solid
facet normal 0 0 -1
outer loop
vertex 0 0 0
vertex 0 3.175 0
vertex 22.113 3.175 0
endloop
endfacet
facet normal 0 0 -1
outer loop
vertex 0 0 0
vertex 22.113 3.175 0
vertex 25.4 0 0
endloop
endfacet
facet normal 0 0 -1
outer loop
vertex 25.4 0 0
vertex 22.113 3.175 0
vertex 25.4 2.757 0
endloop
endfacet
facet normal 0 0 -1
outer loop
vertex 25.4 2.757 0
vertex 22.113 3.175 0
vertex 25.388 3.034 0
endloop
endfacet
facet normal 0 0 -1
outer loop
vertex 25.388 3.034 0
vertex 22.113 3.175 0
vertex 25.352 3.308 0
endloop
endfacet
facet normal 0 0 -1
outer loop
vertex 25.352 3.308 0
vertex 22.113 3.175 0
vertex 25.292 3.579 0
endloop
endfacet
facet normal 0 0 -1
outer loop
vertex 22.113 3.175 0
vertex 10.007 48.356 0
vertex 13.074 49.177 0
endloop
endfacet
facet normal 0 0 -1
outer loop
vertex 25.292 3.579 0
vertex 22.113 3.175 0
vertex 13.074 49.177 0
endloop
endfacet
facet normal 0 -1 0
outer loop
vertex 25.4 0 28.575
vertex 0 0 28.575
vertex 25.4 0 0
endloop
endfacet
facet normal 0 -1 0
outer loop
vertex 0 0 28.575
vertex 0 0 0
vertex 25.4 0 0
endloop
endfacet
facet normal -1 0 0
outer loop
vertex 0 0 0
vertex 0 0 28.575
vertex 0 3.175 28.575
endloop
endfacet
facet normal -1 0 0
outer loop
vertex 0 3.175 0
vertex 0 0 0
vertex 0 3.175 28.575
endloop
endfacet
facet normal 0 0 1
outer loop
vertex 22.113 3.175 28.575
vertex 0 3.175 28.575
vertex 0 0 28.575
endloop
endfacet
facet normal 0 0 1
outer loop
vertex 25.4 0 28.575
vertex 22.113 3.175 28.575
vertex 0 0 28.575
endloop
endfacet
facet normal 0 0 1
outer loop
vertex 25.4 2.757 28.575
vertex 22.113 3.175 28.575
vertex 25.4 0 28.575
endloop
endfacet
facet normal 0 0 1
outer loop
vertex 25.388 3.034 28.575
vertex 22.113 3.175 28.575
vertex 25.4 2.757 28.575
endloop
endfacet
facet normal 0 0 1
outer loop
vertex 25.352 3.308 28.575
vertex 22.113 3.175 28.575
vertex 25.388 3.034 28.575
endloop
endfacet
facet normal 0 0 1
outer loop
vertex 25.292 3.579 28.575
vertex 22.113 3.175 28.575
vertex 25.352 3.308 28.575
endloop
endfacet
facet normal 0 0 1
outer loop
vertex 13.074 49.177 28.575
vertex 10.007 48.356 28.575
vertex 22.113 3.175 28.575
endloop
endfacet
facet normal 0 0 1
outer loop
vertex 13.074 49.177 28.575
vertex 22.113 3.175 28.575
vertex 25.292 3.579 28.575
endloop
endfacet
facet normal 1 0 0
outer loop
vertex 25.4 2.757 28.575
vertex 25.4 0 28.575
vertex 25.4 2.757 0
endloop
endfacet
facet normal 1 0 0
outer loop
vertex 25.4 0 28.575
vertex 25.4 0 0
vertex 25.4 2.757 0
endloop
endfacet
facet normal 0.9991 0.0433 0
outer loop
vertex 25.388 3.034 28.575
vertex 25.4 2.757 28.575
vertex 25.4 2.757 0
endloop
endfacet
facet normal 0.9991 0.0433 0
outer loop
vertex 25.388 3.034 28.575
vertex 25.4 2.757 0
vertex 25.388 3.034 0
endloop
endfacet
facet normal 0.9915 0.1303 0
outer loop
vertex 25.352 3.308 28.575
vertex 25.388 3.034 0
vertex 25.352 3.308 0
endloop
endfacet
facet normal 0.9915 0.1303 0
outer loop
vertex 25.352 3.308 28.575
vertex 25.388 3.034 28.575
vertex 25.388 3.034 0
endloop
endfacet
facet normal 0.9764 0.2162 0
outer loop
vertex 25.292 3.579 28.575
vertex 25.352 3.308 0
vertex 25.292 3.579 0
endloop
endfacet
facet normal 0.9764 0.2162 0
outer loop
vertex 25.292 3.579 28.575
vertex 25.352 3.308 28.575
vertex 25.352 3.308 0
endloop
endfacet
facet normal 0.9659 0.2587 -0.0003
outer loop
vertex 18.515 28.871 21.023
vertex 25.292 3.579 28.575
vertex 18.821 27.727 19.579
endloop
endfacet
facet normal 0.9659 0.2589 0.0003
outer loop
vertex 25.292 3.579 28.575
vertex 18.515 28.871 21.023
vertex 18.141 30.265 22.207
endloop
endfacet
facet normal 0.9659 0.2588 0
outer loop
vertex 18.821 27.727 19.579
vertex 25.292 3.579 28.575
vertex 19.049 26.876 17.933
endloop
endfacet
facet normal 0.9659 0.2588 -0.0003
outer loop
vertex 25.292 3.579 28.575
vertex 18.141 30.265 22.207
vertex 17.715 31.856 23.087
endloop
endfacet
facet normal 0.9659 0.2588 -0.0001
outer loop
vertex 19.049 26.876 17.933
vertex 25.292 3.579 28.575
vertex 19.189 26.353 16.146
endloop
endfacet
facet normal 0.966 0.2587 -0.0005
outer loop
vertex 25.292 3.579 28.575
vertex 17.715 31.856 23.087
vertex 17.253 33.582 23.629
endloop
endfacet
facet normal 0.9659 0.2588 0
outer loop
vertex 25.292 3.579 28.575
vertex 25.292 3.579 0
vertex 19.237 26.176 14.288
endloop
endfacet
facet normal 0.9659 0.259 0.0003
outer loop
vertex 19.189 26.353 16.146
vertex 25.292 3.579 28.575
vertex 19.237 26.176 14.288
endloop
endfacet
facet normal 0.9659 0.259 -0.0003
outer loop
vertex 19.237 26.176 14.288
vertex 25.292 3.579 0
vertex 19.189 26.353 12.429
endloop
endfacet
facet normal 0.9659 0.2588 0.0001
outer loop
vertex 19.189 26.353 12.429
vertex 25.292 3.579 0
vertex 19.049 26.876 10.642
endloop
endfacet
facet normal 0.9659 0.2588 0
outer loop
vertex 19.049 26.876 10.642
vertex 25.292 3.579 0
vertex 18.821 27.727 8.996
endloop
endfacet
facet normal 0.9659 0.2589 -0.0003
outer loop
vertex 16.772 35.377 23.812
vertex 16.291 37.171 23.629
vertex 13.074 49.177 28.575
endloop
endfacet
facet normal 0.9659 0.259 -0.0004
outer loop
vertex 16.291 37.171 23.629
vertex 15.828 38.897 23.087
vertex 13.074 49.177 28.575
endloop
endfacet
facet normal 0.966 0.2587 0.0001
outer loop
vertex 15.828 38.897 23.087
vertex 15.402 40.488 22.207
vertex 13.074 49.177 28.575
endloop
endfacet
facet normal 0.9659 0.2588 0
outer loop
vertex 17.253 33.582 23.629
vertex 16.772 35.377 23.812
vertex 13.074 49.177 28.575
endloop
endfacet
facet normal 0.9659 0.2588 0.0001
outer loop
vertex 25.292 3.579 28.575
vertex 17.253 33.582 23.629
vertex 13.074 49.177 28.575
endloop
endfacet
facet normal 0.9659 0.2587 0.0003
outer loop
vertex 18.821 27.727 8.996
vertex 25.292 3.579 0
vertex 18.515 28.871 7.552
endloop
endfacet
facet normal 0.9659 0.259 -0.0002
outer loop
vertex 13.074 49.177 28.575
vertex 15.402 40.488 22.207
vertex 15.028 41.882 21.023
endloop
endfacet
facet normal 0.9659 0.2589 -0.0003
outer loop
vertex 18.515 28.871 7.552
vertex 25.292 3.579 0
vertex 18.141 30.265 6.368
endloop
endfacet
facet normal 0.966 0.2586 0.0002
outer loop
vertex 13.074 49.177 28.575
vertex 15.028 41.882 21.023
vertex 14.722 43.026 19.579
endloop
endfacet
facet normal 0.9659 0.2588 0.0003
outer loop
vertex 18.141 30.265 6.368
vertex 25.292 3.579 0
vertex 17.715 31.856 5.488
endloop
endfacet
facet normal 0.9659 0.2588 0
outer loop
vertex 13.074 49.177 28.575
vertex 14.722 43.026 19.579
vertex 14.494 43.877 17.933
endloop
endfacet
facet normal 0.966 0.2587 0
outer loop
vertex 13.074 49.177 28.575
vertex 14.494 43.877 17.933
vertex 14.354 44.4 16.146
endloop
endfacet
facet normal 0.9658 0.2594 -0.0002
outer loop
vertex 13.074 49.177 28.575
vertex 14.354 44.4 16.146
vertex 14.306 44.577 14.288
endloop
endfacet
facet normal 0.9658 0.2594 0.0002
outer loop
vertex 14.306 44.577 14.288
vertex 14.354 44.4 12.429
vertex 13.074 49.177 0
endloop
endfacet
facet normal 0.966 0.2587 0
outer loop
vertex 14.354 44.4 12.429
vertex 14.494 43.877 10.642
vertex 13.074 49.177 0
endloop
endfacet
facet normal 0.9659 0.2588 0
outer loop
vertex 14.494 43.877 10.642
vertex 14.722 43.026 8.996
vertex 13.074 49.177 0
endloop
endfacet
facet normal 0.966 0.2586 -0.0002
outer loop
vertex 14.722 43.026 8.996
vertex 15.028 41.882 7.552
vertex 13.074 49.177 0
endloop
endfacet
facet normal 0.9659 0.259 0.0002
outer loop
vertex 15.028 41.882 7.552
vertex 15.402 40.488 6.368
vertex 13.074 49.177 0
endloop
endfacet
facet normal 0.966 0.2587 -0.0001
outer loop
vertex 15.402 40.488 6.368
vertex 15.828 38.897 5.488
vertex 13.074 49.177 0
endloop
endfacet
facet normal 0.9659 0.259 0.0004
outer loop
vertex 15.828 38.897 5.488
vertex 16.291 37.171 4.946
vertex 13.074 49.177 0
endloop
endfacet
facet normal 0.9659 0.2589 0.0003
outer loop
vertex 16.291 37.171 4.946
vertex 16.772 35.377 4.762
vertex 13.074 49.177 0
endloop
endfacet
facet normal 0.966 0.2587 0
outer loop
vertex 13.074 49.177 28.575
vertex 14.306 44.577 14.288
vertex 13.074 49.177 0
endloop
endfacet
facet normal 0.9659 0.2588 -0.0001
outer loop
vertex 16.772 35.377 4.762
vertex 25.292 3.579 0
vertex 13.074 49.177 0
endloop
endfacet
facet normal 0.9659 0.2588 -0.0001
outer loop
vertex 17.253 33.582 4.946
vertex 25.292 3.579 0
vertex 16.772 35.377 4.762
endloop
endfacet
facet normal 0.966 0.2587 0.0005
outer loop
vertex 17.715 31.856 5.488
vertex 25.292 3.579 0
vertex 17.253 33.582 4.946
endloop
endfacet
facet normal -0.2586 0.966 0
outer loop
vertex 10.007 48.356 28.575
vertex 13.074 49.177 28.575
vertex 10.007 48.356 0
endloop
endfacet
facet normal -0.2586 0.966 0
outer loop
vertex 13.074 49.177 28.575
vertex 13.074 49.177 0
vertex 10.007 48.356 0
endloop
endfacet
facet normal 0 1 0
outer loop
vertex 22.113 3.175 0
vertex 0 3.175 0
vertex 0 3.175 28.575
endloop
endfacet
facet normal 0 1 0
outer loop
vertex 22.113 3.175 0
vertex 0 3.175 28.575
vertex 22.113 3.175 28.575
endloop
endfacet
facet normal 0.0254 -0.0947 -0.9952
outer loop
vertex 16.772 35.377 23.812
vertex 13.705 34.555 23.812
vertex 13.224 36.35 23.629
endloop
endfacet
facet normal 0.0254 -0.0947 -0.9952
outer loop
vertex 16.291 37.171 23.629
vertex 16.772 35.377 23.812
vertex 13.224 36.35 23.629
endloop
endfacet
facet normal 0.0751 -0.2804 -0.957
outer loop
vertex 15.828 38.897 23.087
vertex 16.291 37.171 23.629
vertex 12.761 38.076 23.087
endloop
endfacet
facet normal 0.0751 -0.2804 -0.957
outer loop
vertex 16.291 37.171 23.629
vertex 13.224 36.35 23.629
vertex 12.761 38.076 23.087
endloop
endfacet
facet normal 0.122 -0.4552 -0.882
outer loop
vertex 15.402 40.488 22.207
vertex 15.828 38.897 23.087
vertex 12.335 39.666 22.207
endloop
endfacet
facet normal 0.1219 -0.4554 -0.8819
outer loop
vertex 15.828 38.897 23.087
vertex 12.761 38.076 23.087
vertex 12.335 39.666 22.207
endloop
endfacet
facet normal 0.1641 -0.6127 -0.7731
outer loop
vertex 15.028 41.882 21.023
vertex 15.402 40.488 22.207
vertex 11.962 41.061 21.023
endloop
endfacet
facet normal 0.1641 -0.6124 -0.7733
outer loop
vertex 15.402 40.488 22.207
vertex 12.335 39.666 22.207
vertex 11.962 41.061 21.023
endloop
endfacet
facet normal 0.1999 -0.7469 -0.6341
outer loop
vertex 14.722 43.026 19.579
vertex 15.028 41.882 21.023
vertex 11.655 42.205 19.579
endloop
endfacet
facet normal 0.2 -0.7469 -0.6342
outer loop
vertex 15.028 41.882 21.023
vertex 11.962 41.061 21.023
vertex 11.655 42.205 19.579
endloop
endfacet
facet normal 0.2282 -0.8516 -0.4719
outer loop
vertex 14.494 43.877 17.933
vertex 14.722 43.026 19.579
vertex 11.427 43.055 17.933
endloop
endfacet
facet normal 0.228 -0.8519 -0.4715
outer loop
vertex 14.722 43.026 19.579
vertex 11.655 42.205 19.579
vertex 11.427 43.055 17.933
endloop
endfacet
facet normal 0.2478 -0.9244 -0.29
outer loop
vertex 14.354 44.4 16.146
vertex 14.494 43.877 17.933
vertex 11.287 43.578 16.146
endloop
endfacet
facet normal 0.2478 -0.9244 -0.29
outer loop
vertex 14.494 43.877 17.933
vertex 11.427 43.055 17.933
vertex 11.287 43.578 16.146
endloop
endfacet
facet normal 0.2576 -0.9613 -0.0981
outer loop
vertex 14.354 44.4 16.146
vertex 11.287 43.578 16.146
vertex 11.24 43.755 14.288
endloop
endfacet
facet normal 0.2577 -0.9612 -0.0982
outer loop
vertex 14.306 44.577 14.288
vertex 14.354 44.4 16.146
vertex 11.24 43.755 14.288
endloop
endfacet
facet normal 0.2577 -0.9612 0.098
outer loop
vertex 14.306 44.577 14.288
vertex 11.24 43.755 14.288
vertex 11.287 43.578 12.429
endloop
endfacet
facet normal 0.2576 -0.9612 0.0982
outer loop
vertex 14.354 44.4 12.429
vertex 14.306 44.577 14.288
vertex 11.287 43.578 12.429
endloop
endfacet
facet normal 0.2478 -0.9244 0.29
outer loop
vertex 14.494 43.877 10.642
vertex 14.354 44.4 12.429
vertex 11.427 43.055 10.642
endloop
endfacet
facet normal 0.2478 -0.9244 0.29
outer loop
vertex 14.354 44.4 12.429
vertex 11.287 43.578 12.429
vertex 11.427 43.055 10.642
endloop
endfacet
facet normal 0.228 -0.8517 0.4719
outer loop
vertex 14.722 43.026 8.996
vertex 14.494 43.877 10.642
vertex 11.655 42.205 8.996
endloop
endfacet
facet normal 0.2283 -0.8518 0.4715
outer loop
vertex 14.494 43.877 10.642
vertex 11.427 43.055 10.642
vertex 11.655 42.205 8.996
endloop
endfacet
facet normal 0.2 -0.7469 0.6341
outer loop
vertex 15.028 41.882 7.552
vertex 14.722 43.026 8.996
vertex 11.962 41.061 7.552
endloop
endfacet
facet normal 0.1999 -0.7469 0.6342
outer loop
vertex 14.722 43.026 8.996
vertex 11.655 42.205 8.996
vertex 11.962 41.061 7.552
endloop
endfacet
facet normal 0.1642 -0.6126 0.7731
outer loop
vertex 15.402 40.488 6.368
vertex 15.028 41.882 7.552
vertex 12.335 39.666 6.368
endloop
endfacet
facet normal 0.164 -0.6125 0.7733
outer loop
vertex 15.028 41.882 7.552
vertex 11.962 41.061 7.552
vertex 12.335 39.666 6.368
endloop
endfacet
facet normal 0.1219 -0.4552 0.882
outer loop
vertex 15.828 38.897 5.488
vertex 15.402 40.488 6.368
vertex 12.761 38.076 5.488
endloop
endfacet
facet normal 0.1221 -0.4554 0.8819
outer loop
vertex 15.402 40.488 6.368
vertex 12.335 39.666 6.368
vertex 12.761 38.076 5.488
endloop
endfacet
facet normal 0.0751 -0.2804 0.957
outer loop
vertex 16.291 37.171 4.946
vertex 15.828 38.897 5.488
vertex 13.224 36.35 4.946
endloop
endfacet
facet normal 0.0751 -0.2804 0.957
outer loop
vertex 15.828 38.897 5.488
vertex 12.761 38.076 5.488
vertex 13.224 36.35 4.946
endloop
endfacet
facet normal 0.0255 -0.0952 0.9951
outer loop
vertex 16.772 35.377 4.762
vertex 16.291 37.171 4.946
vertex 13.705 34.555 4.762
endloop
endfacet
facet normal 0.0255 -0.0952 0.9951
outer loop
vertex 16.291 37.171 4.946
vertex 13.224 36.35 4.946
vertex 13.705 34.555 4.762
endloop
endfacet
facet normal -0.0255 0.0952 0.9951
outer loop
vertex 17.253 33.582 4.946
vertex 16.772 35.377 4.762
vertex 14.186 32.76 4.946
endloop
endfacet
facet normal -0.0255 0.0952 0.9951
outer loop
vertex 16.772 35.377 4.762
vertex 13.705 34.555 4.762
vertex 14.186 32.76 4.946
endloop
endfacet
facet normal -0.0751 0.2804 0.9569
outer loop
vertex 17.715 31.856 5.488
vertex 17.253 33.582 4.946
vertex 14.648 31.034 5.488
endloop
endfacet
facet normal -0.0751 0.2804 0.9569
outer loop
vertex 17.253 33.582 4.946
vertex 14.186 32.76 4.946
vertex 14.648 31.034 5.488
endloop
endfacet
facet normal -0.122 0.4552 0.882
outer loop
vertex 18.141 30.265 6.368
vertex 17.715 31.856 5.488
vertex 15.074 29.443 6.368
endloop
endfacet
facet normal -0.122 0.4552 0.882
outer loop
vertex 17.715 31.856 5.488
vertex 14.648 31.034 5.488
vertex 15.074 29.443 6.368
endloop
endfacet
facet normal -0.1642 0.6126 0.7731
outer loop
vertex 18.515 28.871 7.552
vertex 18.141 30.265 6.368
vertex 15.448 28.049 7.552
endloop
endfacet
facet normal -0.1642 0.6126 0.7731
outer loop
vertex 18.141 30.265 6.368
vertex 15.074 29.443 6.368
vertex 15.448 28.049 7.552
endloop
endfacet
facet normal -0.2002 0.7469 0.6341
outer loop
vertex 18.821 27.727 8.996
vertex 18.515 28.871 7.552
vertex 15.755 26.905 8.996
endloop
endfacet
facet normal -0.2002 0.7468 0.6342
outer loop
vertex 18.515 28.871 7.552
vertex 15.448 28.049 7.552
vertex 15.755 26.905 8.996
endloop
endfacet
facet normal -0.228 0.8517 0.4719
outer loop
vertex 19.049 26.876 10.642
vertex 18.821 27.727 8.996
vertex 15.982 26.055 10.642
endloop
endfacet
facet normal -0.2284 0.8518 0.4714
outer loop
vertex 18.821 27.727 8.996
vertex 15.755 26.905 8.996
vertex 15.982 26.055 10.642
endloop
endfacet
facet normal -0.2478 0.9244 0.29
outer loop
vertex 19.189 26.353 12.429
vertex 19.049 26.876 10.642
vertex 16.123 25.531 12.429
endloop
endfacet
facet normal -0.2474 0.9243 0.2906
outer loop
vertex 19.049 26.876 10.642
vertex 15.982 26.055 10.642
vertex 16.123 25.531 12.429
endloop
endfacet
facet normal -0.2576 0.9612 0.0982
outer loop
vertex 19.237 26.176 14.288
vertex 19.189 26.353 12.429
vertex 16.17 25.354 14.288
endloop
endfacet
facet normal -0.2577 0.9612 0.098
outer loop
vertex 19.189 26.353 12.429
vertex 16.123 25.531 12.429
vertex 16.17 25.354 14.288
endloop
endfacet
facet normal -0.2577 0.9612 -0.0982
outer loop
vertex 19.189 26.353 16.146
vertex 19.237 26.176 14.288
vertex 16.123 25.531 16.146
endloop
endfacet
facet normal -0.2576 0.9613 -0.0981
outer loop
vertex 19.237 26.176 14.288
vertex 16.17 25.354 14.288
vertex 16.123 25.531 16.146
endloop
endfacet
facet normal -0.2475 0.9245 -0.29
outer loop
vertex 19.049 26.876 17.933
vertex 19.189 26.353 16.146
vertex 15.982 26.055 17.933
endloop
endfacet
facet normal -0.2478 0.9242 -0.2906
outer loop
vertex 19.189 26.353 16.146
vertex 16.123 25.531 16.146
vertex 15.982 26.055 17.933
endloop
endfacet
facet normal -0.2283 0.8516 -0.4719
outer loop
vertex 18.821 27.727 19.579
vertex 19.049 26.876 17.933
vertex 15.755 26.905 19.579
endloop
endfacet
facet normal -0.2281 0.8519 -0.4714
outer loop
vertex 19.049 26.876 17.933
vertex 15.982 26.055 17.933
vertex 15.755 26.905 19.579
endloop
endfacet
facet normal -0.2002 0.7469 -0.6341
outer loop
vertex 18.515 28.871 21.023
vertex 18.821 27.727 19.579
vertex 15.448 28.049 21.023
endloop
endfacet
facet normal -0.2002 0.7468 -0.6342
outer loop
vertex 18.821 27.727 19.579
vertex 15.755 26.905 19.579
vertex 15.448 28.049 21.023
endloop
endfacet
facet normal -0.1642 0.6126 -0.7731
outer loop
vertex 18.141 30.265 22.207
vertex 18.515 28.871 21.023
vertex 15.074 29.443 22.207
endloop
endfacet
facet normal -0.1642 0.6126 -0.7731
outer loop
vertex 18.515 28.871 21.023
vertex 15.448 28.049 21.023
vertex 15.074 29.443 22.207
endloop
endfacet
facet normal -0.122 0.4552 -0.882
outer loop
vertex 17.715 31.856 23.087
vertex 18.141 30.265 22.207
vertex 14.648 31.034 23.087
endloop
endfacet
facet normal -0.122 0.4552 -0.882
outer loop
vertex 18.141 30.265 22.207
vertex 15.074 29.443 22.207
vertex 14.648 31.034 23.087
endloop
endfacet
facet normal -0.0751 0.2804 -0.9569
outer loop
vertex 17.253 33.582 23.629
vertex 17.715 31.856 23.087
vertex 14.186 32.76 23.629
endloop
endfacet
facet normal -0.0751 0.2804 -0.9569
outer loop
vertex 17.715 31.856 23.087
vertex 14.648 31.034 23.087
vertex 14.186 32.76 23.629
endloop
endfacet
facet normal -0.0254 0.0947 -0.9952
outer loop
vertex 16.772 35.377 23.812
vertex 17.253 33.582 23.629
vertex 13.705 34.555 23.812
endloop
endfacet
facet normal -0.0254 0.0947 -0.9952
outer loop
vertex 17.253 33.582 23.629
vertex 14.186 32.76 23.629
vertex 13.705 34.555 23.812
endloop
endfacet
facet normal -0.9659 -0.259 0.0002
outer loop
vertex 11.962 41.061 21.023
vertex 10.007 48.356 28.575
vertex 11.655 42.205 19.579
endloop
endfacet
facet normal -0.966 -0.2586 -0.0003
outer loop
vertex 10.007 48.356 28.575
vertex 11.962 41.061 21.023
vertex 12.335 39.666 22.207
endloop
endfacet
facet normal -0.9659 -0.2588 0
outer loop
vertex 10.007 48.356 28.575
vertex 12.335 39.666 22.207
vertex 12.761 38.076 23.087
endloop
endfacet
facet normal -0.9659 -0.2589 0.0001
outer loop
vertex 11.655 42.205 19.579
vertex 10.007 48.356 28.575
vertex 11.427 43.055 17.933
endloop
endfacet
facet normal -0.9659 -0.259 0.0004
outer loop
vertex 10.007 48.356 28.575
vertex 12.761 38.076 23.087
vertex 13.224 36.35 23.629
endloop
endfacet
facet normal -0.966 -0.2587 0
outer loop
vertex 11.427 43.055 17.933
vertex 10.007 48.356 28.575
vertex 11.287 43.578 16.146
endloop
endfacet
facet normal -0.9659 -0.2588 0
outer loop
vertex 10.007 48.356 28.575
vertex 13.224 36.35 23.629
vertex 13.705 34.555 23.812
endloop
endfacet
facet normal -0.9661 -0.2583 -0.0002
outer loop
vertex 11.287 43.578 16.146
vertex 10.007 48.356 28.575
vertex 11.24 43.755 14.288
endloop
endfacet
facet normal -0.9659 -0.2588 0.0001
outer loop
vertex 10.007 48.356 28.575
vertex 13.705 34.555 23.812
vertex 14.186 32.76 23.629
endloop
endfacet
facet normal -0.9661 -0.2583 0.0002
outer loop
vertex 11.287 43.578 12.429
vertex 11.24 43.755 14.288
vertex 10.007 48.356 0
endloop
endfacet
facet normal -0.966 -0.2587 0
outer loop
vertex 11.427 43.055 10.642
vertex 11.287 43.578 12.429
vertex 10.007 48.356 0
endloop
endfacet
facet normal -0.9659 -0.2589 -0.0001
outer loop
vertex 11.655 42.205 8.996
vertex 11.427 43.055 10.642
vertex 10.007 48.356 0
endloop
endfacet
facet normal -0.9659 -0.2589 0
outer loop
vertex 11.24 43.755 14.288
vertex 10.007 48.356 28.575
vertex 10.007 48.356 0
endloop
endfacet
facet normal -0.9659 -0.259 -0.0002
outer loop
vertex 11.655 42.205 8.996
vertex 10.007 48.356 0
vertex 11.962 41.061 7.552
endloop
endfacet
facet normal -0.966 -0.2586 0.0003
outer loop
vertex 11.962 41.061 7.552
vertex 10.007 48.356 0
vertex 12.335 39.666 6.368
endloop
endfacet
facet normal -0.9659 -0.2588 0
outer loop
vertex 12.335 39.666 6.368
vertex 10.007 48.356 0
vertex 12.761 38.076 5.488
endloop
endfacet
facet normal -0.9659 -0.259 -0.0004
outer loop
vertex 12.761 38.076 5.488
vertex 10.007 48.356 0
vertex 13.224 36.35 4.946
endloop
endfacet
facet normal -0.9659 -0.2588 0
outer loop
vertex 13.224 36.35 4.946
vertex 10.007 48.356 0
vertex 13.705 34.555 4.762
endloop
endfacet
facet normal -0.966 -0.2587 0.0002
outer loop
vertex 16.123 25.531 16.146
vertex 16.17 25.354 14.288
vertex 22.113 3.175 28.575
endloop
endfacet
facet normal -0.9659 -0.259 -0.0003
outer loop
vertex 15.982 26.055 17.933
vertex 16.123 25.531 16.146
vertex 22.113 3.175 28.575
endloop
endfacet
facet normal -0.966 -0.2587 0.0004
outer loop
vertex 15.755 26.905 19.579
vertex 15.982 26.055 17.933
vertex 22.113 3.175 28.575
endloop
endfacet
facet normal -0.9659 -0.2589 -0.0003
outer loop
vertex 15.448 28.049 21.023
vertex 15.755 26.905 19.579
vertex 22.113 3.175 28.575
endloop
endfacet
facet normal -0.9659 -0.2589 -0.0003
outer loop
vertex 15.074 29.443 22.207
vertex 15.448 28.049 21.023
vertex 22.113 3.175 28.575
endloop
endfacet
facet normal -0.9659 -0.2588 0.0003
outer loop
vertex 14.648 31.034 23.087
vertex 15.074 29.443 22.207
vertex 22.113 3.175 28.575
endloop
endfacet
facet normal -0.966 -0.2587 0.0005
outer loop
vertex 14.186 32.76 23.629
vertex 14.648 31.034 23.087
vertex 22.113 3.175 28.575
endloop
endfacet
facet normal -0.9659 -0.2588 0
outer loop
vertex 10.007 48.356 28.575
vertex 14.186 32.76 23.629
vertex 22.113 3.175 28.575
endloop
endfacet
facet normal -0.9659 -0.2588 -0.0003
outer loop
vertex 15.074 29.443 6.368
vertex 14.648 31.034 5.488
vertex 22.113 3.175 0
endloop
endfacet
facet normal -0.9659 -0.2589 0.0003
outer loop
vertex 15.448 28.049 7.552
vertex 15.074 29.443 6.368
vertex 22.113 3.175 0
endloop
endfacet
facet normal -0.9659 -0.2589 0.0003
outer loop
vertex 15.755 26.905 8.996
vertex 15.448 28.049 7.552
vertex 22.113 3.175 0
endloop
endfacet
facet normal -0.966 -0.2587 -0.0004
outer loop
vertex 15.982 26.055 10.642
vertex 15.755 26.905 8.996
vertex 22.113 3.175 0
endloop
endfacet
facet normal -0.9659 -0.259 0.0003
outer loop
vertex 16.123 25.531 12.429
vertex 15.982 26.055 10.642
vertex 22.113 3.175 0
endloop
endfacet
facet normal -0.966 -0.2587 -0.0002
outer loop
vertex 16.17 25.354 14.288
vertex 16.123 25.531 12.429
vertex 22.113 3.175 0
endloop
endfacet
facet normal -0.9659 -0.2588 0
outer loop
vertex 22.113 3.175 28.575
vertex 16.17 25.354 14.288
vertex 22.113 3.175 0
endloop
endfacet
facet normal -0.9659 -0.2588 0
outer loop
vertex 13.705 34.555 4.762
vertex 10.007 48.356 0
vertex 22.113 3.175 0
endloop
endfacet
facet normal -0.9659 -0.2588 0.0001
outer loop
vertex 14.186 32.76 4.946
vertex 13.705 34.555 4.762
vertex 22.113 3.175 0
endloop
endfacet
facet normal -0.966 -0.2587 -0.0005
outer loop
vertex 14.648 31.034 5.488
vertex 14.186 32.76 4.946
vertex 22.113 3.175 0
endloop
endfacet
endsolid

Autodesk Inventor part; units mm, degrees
ref_plane "YZ Plane" through (0, 0, 0) normal (1, 0, 0) x (0, 1, 0)
ref_plane "XZ Plane" through (0, 0, 0) normal (0, 1, 0) x (-1, 0, 0)
ref_plane "XY Plane" through (0, 0, 0) normal (0, 0, 1) x (1, 0, 0)
sketch "Sketch1" plane through (0, 0, 0) normal (0, 0, 1) x (1, 0, 0)
  line L0 (0, 0) -> (0, 3.175)
  line L1 (0, 0) -> (25.4, 0)
  line L2 (25.4, 0) -> (25.4, 3.175)
  line L3 (25.4, 3.175) -> (13.0737, 49.1772)
  line L4 (13.0737, 49.1772) -> (10.0069, 48.3555)
  line L5 (10.0069, 48.3555) -> (22.113, 3.175)
  line L6 (0, 3.175) -> (22.113, 3.175)
  dimension "d0" = 3.175
  dimension "d1" = 25.4
  dimension "d3" = 3.175
  dimension "d4" = 75
  dimension "d5" = 47.625
extrude "Extrusion1" add sketch "Sketch1" along normal blind 28.575
sketch "Sketch2" plane through (10.0069, 48.3555, 0) normal (-0.9659, -0.2588, 0) x (0, 0, 1)
  line L0 (28.575, -46.7743) -> (28.575, 0) projected
  line L1 (0, 0) -> (28.575, 0) projected
  circle A0 centre (14.2875, -14.2875) radius 9.525
  point P0 (0, -44.1178)
  dimension "d8" = 19.05
  dimension "d9" = 14.2875
  dimension "d10" = 14.2875
extrude "Extrusion2" cut sketch "Sketch2" against normal blind 28.575
fillet "Fillet1" radius 3.175 1 edges at (25.4, 3.175, 14.2875)
equation "\"d3\" = d0"
equation "\"d10\" = d9"
properties part number "bunny throw piston bracket"
